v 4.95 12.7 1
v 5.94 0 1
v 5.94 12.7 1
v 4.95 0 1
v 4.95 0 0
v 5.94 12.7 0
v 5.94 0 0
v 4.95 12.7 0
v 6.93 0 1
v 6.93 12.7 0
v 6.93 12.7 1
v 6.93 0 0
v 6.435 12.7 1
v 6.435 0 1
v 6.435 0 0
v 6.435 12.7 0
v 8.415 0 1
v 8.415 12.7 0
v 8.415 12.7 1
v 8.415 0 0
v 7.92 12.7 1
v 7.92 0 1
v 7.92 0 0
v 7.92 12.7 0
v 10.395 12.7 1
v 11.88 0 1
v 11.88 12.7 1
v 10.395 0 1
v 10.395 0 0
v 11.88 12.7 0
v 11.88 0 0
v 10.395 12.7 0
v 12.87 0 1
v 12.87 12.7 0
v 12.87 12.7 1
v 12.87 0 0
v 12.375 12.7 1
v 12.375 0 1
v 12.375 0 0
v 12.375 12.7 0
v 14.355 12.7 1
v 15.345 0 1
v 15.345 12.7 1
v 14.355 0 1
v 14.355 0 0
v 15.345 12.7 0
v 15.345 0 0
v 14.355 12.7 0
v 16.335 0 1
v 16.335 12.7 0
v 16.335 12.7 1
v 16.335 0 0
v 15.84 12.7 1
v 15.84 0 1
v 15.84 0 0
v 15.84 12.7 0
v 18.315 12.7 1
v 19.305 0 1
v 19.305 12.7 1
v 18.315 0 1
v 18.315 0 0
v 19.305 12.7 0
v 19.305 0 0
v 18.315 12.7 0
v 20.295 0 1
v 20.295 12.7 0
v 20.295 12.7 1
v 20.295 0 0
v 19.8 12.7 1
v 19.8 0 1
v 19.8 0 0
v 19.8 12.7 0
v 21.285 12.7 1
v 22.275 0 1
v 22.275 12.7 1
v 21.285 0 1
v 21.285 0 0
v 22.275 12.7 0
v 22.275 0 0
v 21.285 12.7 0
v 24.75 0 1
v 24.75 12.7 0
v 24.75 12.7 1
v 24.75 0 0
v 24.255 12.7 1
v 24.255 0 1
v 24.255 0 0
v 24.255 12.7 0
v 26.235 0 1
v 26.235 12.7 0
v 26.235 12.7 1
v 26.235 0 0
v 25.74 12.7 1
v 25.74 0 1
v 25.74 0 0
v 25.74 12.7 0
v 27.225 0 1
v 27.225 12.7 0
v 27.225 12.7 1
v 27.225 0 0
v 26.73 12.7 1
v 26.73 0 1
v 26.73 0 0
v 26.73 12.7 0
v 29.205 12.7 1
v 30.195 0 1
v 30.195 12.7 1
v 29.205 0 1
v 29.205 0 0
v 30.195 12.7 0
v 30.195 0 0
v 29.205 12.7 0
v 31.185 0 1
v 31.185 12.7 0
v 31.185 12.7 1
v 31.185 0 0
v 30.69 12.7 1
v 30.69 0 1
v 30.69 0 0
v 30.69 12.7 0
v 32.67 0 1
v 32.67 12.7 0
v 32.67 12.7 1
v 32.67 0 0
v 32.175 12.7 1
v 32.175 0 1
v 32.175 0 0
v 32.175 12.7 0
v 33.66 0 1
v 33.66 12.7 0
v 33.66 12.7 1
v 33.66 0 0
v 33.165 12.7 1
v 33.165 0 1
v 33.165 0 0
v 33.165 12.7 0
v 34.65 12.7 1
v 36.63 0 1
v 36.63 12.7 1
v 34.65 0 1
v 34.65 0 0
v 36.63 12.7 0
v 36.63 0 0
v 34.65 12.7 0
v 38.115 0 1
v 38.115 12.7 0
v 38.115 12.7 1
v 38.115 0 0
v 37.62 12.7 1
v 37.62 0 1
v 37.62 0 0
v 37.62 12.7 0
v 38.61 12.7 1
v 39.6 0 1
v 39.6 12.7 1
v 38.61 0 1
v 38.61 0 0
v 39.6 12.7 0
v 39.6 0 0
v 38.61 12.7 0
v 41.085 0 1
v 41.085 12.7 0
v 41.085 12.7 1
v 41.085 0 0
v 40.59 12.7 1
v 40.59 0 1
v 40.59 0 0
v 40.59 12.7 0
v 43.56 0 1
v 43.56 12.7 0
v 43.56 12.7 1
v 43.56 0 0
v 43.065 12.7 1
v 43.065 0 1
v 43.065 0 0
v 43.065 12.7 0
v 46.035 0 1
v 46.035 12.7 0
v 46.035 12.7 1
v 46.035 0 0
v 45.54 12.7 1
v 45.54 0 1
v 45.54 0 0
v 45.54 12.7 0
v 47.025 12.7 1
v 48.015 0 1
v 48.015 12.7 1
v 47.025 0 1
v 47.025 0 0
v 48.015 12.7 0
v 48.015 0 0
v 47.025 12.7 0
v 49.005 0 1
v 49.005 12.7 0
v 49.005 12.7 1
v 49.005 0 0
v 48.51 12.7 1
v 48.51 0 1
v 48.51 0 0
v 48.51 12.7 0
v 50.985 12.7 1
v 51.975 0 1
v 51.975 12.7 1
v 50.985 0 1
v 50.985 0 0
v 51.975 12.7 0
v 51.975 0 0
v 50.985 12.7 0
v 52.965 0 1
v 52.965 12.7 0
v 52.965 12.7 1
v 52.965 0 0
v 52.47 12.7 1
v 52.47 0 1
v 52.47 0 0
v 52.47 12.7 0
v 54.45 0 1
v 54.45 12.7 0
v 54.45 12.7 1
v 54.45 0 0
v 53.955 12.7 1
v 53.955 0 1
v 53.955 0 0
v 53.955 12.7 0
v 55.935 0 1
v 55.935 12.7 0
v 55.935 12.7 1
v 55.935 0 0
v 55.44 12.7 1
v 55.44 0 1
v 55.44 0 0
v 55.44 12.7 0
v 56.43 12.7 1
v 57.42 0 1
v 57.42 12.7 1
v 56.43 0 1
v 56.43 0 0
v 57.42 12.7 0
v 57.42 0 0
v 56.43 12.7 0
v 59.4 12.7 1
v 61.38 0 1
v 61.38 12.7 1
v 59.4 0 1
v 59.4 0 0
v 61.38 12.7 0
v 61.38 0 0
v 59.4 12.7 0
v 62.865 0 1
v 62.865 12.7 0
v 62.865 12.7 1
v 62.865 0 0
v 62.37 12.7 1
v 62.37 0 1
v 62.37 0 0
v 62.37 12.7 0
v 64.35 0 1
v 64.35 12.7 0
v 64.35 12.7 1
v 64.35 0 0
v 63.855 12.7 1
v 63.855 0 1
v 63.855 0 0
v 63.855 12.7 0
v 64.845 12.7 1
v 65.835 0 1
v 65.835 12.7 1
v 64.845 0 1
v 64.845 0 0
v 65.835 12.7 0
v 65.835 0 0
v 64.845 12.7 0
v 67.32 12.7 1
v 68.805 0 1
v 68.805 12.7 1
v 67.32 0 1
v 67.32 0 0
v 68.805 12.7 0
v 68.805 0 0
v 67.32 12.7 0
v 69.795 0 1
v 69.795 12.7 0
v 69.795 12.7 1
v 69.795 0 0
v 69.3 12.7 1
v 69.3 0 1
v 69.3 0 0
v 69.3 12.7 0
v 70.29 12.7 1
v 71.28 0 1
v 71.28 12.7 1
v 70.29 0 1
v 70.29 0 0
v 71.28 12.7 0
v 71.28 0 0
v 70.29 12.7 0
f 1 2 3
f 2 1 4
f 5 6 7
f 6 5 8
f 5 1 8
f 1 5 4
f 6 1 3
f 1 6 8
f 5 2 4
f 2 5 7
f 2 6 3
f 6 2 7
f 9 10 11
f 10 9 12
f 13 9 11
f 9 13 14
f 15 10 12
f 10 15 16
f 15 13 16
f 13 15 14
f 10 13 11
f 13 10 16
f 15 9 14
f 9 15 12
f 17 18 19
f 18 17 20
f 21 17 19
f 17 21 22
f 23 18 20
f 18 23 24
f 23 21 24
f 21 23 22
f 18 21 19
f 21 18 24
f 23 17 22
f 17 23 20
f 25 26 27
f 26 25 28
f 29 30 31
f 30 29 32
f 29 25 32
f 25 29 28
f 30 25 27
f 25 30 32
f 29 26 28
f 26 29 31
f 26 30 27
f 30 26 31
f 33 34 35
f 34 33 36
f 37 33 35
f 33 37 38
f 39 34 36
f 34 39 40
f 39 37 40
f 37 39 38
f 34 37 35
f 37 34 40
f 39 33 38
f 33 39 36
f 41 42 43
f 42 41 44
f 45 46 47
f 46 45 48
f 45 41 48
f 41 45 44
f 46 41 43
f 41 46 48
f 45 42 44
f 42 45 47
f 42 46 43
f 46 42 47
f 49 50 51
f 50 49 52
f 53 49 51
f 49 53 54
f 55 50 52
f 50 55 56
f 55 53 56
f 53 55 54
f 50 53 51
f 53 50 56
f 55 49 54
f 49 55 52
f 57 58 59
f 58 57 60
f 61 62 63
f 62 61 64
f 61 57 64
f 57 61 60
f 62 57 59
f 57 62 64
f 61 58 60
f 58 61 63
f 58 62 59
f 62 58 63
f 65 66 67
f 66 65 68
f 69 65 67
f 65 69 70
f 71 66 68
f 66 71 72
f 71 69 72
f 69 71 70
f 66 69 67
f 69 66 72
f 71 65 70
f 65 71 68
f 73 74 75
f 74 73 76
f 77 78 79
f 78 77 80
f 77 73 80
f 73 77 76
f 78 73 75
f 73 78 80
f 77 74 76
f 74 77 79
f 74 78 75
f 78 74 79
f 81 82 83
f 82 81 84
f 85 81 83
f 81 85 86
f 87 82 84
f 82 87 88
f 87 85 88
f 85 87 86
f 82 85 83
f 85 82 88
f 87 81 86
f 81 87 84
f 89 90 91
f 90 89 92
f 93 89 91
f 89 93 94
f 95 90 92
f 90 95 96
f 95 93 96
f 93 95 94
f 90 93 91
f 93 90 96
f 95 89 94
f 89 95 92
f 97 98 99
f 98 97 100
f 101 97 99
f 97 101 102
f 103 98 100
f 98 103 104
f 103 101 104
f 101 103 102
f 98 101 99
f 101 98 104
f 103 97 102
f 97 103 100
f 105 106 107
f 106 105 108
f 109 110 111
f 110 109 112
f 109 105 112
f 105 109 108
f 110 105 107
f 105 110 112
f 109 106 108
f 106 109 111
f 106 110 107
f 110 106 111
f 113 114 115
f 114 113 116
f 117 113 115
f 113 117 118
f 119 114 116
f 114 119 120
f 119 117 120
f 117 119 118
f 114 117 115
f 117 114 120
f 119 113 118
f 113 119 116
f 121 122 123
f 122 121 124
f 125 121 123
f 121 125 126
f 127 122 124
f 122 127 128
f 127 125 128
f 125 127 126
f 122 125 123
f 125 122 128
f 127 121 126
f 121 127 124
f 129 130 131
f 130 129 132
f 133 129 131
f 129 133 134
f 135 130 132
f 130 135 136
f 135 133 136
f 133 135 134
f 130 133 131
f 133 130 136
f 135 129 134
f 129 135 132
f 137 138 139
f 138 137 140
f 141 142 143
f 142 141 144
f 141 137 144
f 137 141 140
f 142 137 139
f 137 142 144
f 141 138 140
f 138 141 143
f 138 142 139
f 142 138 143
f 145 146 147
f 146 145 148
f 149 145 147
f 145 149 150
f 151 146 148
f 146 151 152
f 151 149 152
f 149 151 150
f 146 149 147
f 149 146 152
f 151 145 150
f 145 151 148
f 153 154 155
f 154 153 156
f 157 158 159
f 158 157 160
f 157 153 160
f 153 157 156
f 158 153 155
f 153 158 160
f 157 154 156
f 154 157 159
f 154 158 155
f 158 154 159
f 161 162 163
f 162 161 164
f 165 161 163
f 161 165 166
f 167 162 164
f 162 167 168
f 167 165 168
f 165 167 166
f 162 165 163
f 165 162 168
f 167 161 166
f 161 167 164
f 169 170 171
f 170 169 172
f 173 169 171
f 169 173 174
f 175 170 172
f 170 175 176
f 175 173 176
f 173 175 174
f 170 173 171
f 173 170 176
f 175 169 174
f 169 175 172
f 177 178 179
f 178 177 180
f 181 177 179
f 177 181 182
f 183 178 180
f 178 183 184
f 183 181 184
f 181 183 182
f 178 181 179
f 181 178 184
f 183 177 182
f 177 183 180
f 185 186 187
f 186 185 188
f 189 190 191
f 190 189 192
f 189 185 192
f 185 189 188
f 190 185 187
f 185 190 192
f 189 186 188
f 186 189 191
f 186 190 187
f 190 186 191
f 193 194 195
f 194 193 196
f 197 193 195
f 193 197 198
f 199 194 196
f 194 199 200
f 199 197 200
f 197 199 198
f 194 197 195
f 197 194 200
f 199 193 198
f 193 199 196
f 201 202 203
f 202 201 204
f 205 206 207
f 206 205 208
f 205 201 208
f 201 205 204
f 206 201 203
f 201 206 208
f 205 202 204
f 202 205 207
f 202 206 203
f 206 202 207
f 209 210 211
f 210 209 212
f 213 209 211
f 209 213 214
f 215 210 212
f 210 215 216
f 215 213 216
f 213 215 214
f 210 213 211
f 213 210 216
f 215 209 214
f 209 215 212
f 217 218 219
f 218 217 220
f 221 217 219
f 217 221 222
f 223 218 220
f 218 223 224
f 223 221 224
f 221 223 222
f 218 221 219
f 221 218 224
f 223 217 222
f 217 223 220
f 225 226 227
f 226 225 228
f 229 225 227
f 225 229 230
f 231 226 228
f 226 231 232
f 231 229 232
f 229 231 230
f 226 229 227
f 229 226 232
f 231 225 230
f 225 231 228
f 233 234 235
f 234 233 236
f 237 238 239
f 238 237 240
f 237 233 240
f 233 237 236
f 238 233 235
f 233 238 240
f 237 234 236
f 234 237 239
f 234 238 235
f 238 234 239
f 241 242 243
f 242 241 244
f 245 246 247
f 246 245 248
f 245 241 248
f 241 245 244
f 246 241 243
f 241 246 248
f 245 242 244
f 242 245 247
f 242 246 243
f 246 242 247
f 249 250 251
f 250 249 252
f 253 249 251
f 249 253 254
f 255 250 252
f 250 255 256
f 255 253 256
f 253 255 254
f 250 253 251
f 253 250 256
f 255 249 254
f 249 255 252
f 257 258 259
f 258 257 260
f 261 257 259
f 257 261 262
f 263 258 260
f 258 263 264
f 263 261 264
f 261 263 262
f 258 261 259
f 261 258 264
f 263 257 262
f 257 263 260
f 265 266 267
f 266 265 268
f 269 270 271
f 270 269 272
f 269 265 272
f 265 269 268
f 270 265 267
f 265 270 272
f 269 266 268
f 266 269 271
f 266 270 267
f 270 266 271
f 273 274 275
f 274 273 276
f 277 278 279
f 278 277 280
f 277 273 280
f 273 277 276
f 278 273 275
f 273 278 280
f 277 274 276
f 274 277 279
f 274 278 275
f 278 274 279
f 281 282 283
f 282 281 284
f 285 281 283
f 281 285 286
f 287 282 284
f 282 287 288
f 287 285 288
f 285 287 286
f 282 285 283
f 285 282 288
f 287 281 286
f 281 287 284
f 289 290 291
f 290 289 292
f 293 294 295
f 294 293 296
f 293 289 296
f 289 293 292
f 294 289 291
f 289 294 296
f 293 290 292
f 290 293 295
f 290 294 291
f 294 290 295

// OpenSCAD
// file: ../../util/bitmap.scad
/*****************************************************************************
 * Module Bitmap Library
 * Modules to create bitmaps of unit squares from 1 or 2 dimensional vectors.
 *****************************************************************************
 * Copyright 2017 Chris Baker
 *
 * This program is free software: you can redistribute it and/or modify
 * it under the terms of the GNU Lesser General Public License as published by
 * the Free Software Foundation, either version 3 of the License, or
 * (at your option) any later version.
 *
 * This program is distributed in the hope that it will be useful,
 * but WITHOUT ANY WARRANTY; without even the implied warranty of
 * MERCHANTABILITY or FITNESS FOR A PARTICULAR PURPOSE.  See the
 * GNU Lesser General Public License for more details.
 *
 * You should have received a copy of the GNU Lesser General Public License
 * along with this program.  If not, see <http://www.gnu.org/licenses/>.
 *****************************************************************************
 * Usage:
 * Include this file with the "use" tag.
 * Depends on compat.scad library.
 *
 * API:
 *   1dbitmap(bitmap, center, expansion, vector_mode)
 *   2dbitmap(bitmap, center, expansion, vector_mode)
 *     Generate a 1 or 2-Dimensional field of modules based on the provided
 *     bitmap vector. See Bitmap Vectors below.
 *     The center flag determines whether to center the bitmap on the origin.
 *     The expansion value actually shrinks each cube in the x and y
 *     dimension by the specified amount.
 *     The vector_mode flag determines whether to create 3D solid geometry
 *     (unit cubes) or 2D vector geometry (squares).
 *
 * Bitmap Vectors:
 *   The bitmap vectors primarily provide boolean information.
 *   A module will be placed where these vectors have a postive value and
 *   skipped where they have a negative value. I.E. 0, -1, false, and undef
 *   are all equivalent and result in a skip. 1 and true are equivalent and
 *   result in a placed 1-unit module.
 *   Further, if the value is an integer it will be treated as a height for
 *   the module, allowing z-maps to be created.
 *   If the value is not an integer or boolean, it will be treated as a color
 *   reference. This can be a string or RGBA vector that will be used to
 *   color the module in the OpenSCAD preview window.
 *   In current versions of OpenSCAD, the color has no effect in the rendered
 *   view or STL output.
 *
 * Vector Mode:
 *   Although OpenSCAD supports generating 2D geometry, there are several
 *   caveats:
 *   - 2D and 3D geometry cannot be mixed
 *   - Extruding 2D geometry causes color information to be lost
 *   - All 2D geometry is projected onto the XY plane when rendering
 *   - Rendering also results in loss of color (same as 3D)
 *   - The SVG exporter is somewhat limited:
 *     - The pixel size of the image is hard-coded in the file
 *     - The title of the image is a generic string
 *     - The color selection for stroke and fill is fixed
 *     - The stroke-width is set to a large value that will cause overlap
 *     - The background is transparent
 *     - Only one path element is created with all of the geometry; there is
 *       no easy way to split up the geometry into multiple logical units.
 *     - These issues can mostly be resolved by hand-editing the file:
 *       - Remove or modify the width and height parameters from the svg
 *         element at the top of the file to provide better scaling.
 *       - Edit the title element at the top of the file to change the title.
 *       - Edit the stroke and fill parameters of the path element (these will
 *         probably be at the end of the file).
 *       - Set the stroke-width parameter for the path element to 0.
 *****************************************************************************/
use <compat.scad>

/*
 * 2dbitmap - Turn a 2D vector into a bitmap of cubes
 *
 * bitmap - 2D vector representing where to place each cube
 *          Value can either be boolean, z-height, or color
 * center - center cubes around the origin
 * expansion - size of gap around each pixel (screendoor)
 * vector_mode - create a 2D vector drawing instead of 3D extrusion
 */
module 2dbitmap(bitmap=[[1,0],[0,1]], center=false, expansion=0, vector_mode=false)
{
	ylen=len(bitmap)-1;

	for (y=[0:ylen]) {
		xlen=len(bitmap[y])-1;
		for (x=[0:xlen])
			translate([x-(center?xlen/2:0),ylen-y-(center?ylen/2:0),0])
				if (is_indexable(bitmap[y][x]))
					color(bitmap[y][x])
						if (vector_mode)
							square([1-expansion,1-expansion], center=center);
						else
							cube([1-expansion,1-expansion,1], center=center);
				else
					if (bitmap[y][x])
						if (vector_mode)
							square([1-expansion,1-expansion], center=center);
						else
							cube([1-expansion,1-expansion,clamp_nonnum(bitmap[y][x])], center=center);
	}
}

module 1dbitmap(bitmap=[1,0,1,0,1], center=false, expansion=0, vector_mode=false)
	2dbitmap([bitmap], center, expansion, vector_mode);

/*
 * Examples
 */

// 1D with z-height
translate([10,0,0]) scale([1,10,1])
	1dbitmap(bitmap=[1,1,0,2,0,0,3], expansion=.1);

// 1D with boolean
translate([-20,0,0]) scale([1,10,1])
	1dbitmap(bitmap=[true,false,true,false,true,true]);

// 2D with z-height
scale([2,2,1])
	2dbitmap(bitmap=[[1,0,2,1],[0,3,3,0],[1,1,0,1]],
		center=true);

// 1D with color
translate([0,-10,0]) scale([1,3,1])
	1dbitmap(bitmap=["red","white","blue",[0,0.3,0,0.5]]);

// 1D with color using 2D-vector-mode
translate([-7,-8,0]) scale([1,2])
	1dbitmap(bitmap=["red",0,"blue",0,"green"], vector_mode=true);
translate([-4.5,-10,0]) scale([1,2])
	1dbitmap(bitmap=["red",0,"blue",0,"green"], vector_mode=true, center=true);
// main file
/* Unit Test 05: Test concatenating flag */
use <../code128.scad>

code_128(concat(
		cs128_b("W"),
		cs128_b("ikipedia", concatenating=true)),
	bar="black");
